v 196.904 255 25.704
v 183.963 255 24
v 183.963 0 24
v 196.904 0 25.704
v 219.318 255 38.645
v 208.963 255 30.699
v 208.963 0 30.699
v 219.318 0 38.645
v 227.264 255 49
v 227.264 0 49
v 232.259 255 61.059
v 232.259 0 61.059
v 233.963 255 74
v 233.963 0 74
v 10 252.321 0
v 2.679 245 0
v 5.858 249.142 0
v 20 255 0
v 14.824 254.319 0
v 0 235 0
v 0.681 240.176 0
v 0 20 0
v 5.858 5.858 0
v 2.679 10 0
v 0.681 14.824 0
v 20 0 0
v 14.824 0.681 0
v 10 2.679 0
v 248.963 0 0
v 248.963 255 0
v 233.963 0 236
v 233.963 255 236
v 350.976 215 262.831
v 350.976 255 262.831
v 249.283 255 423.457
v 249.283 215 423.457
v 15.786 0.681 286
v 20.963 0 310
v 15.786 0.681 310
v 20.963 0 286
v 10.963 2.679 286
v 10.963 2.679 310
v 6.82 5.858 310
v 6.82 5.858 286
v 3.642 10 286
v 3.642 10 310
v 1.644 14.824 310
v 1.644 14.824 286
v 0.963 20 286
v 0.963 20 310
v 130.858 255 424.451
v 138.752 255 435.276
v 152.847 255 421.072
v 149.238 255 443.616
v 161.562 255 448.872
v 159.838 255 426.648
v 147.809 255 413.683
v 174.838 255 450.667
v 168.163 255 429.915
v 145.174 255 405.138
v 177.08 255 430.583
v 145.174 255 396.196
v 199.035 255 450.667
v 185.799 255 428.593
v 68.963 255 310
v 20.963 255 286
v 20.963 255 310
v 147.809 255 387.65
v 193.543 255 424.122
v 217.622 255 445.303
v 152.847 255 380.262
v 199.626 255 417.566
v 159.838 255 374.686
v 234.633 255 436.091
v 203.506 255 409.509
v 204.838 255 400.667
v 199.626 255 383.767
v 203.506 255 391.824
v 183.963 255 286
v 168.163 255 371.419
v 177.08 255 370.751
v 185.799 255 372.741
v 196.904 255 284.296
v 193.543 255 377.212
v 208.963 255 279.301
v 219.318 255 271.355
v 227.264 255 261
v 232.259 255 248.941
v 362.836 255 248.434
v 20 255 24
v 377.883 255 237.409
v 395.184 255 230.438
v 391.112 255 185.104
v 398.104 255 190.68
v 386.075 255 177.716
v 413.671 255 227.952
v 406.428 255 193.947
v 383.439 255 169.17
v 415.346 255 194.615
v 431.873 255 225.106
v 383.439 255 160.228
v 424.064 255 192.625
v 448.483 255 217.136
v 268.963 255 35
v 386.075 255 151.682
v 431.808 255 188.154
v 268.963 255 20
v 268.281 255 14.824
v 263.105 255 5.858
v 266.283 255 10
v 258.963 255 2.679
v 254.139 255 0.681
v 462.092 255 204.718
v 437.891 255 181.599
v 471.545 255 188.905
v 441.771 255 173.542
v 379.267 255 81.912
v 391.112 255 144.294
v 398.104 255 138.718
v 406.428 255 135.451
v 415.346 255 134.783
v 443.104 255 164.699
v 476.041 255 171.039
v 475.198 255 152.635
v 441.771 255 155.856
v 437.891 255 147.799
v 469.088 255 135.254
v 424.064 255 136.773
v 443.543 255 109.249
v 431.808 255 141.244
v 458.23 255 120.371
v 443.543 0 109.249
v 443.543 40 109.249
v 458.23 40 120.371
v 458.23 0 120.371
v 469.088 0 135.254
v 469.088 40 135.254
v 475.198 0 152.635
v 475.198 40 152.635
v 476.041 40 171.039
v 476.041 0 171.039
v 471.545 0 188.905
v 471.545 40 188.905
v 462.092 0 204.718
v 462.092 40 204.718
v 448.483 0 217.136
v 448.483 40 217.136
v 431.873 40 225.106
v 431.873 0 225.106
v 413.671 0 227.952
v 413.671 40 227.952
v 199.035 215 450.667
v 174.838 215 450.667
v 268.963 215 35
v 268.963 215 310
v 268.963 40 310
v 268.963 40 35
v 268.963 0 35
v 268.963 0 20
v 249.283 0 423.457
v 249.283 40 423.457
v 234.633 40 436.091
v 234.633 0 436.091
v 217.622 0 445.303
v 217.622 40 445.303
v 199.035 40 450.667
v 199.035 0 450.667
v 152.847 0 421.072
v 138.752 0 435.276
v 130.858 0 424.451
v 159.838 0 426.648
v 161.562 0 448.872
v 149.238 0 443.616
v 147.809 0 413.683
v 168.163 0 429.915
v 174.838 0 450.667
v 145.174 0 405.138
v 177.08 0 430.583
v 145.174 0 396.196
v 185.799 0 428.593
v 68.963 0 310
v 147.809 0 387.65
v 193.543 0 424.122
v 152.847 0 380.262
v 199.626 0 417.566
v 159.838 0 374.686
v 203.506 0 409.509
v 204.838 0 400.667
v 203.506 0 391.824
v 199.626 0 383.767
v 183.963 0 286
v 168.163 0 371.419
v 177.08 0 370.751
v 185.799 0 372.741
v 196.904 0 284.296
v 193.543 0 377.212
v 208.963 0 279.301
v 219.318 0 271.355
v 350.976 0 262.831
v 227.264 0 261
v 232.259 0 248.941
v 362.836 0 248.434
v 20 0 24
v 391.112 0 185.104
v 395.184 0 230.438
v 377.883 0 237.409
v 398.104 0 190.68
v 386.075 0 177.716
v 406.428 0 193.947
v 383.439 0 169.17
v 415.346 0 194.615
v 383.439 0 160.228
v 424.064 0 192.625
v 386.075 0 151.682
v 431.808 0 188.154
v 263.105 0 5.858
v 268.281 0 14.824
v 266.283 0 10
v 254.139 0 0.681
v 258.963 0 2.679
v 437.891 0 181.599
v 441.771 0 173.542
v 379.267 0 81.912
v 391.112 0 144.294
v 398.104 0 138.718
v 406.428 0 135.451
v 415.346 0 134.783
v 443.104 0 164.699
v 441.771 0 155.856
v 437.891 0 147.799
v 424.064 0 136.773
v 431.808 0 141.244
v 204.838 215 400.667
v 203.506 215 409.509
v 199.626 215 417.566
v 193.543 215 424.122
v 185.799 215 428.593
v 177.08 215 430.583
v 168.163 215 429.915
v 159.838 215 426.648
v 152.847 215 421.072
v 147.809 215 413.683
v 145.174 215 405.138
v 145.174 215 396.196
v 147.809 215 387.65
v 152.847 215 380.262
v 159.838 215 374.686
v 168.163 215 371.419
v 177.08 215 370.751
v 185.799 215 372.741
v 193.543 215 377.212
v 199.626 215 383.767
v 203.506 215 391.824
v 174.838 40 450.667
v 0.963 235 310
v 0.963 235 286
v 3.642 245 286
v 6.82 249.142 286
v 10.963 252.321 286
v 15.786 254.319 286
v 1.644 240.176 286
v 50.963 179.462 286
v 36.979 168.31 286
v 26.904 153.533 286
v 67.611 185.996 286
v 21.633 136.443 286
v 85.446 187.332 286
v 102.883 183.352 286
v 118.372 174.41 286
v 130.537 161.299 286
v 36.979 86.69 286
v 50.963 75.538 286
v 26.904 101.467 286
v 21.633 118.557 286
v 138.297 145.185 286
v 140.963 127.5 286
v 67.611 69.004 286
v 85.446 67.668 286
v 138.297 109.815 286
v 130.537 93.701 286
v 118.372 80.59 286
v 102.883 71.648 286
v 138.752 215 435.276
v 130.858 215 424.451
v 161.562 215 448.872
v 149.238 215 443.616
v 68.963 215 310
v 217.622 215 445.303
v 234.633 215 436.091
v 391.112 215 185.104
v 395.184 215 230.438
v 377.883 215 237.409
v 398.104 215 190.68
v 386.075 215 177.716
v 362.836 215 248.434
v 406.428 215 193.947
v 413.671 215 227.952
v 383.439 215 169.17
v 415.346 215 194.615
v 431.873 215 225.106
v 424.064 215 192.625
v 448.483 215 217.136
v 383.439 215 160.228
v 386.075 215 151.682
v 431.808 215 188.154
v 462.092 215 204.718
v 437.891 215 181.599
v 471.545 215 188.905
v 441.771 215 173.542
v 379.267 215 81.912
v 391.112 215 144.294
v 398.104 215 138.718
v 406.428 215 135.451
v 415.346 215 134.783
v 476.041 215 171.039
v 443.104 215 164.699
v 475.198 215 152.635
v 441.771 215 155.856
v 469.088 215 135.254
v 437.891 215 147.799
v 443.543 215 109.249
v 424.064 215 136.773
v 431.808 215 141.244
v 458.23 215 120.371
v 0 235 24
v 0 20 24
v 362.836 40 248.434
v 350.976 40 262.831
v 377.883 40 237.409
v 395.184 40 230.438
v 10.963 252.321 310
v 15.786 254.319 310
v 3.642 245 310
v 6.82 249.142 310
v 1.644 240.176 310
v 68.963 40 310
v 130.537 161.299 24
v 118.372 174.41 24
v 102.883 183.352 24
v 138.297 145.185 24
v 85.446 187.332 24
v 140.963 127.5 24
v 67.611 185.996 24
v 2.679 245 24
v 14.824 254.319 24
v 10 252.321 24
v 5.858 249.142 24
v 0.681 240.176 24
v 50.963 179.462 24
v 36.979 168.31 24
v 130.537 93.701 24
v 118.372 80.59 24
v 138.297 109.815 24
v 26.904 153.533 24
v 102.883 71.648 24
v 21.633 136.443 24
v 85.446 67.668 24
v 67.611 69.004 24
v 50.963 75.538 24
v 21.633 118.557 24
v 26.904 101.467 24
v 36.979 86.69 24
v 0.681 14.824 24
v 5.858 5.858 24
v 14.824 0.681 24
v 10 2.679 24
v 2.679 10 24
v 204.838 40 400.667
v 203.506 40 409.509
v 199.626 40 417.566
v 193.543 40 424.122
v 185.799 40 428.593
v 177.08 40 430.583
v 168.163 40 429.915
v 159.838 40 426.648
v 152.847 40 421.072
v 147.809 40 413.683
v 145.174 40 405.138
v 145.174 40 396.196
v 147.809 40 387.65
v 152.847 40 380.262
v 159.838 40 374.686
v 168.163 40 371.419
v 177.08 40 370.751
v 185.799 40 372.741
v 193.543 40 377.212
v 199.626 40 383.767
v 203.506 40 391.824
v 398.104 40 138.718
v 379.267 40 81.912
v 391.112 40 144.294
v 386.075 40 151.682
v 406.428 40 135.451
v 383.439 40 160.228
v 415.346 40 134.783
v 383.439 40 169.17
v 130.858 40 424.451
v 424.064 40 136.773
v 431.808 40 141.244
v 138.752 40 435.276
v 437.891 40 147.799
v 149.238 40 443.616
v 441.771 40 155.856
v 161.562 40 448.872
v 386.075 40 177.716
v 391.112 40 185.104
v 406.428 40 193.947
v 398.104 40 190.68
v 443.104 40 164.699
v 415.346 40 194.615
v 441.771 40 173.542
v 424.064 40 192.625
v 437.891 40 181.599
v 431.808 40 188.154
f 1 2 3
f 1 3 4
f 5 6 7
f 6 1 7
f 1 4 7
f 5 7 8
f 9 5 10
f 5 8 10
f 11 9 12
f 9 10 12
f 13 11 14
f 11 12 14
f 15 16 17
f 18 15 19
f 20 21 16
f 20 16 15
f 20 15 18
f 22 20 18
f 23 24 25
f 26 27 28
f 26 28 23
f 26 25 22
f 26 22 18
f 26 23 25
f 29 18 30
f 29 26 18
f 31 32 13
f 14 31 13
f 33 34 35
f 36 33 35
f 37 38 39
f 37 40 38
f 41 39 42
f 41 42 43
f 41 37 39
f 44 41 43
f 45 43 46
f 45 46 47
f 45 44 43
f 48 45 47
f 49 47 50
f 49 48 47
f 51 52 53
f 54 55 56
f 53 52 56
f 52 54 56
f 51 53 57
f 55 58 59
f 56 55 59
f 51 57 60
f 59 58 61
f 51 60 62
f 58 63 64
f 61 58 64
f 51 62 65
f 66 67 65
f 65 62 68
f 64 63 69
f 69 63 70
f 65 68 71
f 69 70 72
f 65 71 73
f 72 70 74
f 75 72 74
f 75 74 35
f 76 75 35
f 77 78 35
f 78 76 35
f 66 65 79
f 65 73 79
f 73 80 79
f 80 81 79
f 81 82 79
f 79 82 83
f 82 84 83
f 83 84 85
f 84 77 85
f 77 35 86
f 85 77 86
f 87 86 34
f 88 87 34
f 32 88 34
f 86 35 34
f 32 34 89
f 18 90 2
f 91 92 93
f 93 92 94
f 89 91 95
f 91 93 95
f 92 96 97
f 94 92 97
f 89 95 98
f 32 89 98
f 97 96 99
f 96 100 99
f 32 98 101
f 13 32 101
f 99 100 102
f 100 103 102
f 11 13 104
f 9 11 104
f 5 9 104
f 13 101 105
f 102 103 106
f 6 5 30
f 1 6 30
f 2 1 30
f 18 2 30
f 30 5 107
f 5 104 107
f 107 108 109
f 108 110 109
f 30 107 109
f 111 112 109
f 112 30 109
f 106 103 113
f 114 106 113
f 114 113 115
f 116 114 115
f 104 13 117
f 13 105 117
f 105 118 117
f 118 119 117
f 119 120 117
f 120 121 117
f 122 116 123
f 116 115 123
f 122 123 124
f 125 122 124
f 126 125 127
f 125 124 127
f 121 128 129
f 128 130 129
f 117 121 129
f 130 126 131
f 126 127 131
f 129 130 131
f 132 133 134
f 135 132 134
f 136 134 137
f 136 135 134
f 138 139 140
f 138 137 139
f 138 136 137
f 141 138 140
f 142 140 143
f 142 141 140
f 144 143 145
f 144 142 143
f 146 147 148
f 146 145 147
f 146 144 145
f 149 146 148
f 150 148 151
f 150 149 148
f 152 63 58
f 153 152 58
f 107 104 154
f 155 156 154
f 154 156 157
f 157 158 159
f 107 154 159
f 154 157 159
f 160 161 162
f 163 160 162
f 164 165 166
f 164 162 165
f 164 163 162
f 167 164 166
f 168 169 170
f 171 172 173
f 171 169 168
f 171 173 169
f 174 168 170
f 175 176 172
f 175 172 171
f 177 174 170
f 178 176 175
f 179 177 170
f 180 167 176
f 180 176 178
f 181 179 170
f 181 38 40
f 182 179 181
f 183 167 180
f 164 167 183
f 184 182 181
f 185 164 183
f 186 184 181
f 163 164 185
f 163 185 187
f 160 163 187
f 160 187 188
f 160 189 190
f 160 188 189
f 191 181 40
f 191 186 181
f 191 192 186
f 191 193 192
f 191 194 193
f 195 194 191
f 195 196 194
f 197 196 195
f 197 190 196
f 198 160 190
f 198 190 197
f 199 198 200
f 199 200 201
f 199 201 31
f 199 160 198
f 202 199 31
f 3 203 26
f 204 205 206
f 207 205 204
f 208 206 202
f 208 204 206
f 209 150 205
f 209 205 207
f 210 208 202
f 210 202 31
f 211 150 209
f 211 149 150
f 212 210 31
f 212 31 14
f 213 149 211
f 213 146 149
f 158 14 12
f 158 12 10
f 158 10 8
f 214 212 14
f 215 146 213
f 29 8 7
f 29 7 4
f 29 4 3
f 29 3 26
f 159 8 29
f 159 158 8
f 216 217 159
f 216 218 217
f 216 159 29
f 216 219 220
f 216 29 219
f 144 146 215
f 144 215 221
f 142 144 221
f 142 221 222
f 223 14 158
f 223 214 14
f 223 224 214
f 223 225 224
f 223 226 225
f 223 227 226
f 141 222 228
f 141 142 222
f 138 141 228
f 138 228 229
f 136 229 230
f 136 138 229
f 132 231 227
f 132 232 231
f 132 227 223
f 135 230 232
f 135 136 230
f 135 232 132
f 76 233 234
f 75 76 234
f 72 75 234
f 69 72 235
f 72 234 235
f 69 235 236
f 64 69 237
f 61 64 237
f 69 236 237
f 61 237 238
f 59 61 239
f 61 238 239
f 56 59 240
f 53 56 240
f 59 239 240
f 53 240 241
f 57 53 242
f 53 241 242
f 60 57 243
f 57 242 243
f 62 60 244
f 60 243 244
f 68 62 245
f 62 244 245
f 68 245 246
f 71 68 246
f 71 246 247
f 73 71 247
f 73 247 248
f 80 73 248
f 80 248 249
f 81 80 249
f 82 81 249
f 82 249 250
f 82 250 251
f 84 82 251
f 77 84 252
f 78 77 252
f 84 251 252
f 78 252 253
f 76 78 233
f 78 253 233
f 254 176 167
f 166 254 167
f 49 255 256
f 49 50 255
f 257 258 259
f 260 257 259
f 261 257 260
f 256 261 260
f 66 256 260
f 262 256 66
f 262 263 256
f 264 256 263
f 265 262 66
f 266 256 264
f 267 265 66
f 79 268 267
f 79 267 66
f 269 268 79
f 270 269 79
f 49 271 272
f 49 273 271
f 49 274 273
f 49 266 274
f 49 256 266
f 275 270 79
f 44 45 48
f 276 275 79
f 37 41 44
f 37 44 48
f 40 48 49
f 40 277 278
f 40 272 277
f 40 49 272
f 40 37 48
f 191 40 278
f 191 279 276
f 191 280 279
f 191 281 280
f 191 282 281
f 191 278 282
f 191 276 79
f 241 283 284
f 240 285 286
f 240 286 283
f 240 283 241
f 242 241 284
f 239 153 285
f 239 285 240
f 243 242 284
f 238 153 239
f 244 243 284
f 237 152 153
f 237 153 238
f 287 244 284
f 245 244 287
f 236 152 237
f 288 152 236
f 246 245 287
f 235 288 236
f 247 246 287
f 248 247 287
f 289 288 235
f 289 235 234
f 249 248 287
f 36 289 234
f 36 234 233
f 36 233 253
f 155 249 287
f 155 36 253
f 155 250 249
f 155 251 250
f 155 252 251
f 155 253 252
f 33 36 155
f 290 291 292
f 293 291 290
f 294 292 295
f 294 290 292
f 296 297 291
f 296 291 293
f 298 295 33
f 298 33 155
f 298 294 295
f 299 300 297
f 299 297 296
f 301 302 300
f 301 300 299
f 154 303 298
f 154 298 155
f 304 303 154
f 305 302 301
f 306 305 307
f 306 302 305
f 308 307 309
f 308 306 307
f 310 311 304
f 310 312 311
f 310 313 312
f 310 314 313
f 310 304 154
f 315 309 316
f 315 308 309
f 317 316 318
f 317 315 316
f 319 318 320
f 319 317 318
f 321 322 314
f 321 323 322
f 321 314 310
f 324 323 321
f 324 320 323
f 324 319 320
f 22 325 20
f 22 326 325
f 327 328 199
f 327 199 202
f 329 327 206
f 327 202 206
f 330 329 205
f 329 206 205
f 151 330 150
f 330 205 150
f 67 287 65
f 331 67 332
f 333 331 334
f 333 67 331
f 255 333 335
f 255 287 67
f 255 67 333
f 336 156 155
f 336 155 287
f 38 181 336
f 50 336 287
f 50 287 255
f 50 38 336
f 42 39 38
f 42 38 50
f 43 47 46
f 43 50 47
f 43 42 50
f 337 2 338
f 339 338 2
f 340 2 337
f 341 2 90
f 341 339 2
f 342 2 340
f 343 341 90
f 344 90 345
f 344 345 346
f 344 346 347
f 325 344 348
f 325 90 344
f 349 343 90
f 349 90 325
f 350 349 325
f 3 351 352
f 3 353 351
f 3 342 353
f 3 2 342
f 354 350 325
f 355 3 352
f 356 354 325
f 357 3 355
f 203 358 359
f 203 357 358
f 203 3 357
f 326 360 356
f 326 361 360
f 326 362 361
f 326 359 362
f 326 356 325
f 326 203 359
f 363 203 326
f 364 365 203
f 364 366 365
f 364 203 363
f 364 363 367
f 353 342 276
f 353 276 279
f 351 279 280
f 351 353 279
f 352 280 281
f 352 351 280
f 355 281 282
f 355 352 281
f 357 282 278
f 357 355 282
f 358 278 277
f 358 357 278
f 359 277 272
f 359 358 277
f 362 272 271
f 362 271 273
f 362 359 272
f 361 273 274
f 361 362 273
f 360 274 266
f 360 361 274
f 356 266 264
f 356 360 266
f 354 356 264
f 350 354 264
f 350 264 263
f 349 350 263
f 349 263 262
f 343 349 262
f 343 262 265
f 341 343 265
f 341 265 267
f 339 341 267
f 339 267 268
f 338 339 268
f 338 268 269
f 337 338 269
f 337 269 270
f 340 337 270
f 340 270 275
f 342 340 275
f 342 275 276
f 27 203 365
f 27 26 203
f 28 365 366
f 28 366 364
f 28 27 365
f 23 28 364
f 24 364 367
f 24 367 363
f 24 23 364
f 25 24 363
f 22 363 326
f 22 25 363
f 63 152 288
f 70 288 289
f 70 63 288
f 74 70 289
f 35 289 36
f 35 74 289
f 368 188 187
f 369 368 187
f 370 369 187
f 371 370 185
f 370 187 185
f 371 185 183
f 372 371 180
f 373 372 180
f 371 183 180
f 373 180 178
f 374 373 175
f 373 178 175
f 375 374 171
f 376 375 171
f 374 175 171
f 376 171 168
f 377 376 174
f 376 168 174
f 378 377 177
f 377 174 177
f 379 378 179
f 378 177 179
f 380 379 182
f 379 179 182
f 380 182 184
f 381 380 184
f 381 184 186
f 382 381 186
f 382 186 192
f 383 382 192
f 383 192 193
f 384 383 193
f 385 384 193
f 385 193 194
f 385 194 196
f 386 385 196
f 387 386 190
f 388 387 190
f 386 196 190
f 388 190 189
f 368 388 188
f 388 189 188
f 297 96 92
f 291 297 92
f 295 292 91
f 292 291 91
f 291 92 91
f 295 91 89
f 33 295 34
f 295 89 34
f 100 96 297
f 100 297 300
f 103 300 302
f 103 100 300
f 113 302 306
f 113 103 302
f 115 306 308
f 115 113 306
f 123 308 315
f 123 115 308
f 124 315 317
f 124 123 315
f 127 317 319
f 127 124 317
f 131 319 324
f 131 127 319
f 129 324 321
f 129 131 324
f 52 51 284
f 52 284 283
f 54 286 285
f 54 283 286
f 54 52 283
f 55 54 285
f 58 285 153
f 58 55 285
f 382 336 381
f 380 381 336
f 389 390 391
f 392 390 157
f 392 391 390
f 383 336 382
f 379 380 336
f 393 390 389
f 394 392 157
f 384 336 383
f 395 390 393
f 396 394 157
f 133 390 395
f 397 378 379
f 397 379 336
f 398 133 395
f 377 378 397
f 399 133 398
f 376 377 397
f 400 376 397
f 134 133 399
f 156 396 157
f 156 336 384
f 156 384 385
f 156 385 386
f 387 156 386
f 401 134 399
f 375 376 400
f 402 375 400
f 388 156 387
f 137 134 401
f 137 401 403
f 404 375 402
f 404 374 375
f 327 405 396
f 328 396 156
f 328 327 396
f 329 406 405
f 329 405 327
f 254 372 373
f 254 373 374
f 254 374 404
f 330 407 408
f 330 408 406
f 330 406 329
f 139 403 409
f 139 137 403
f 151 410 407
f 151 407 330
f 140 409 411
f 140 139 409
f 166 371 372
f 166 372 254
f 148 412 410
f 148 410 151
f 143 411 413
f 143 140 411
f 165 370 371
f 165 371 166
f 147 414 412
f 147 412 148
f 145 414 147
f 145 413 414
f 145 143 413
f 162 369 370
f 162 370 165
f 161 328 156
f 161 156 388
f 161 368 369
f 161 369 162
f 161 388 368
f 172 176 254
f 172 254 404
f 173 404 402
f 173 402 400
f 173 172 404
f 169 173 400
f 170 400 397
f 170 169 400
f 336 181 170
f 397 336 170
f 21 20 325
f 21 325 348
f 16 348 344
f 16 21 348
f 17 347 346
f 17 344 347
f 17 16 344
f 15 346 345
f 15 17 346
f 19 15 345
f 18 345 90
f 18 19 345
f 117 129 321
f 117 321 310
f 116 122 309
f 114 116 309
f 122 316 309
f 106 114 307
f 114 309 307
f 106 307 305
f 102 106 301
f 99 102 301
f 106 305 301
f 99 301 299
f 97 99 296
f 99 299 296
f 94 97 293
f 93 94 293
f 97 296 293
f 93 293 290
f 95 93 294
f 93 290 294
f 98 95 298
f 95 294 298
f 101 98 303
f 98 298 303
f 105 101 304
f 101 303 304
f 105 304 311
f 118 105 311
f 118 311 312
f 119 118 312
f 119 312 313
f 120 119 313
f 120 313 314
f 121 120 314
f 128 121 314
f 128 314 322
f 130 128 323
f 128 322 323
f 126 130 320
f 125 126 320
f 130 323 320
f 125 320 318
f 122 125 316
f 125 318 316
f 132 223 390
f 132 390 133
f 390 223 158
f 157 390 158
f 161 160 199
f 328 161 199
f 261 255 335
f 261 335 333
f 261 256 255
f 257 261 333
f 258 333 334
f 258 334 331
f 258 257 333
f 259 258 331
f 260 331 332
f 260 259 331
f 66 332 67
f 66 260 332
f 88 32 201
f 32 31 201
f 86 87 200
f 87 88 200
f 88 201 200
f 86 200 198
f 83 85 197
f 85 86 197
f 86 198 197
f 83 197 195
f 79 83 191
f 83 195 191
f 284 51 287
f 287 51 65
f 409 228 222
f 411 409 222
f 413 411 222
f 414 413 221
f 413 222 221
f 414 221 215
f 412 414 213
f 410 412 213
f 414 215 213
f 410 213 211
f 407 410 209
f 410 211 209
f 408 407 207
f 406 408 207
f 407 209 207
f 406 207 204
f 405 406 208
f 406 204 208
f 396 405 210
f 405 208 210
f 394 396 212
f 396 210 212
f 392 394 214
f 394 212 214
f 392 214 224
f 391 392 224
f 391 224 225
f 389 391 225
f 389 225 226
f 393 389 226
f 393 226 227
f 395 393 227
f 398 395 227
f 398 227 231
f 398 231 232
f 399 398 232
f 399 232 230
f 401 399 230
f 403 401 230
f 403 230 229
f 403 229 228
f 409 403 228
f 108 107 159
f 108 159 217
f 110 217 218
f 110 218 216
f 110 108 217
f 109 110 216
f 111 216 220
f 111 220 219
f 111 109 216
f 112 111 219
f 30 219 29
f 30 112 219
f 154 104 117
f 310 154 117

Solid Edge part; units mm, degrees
sketch "Sketch1" plane through (0, 0, 0) normal (0, -1, 0) x (1, 0, 0)
  line L0 (268.9626, 310) -> (0.9626, 310)
  line L1 (0.9626, 310) -> (0.9626, 286)
  line L2 (0.9626, 286) -> (183.9626, 286)
  arc A0 (183.9626, 286) -> (233.9626, 236) centre (183.9626, 236) cw
  line L3 (233.9626, 236) -> (233.9626, 74)
  arc A1 (233.9626, 74) -> (183.9626, 24) centre (183.9626, 74) cw
  line L4 (183.9626, 24) -> (0, 24)
  line L5 (0, 24) -> (0, 0)
  line L6 (0, 0) -> (268.9626, 0)
  line L7 (268.9626, 310) -> (268.9626, 0)
extrude "Protrusion1" add sketch "Sketch1" against normal blind 255
sketch "Sketch2" plane through (134.4813, 0, 155) normal (0, -1, 0) x (1, 0, 0)
  arc A0 (216.4946, 107.8308) -> (279.1898, 72.9524) centre (279.8626, 147.9493) ccw
  arc A1 (279.1898, 72.9524) -> (309.0616, -45.7514) centre (278.6223, 9.6991) cw
  line L0 (244.7859, -73.0877) -> (309.0616, -45.7514)
  line L1 (244.7859, -73.0877) -> (134.4813, -120)
  line L2 (134.4813, -120) -> (134.4813, 155)
  line L3 (134.4813, 155) -> (-65.5187, 155)
  line L4 (-65.5187, 155) -> (-3.6234, 269.4515)
  arc A2 (40.3572, 295.6669) -> (-3.6234, 269.4515) centre (40.3572, 245.6669) ccw
  line L5 (40.3572, 295.6669) -> (64.5539, 295.6669)
  arc A3 (64.5539, 295.6669) -> (114.8016, 268.4565) centre (49.0379, 207.0144) cw
  line L6 (114.8016, 268.4565) -> (216.4946, 107.8308)
extrude "ExtrudedProtrusion_2" add sketch "Sketch2" against normal blind 40
mirror "Mirror1" about plane through (238.1797, 127.5, 225.3334) normal (0, -1, 0) of "ExtrudedProtrusion_2"
fillet "Round_1" radius 20 4 edges at (0.9626, 0, 298) (0, 0, 12) (0, 255, 12) (0.9626, 255, 298)
sketch "Sketch3" plane through (248.1797, 0, 225.3334) normal (0, -1, 0) x (1, 0, 0)
  circle A0 centre (-73.3412, 175.3334) radius 30
  circle A1 centre (164.9239, -60.6344) radius 30
extrude "Cutout1" cut sketch "Sketch3" against normal through all
sketch "Sketch4" plane through (91.9813, 117.5, 24) normal (0, 0, 1) x (1, 0, 0)
  circle A0 centre (-11.0187, 10) radius 60
  dimension "D1" = 120
  dimension "D2" = 127.5
  dimension "D3" = 127.5
  dimension "D4" = 80
extrude "Protrusion3" add sketch "Sketch4" along normal up to next
fillet "Round_2" radius 20 1 edges at (268.9626, 127.5, 0)
